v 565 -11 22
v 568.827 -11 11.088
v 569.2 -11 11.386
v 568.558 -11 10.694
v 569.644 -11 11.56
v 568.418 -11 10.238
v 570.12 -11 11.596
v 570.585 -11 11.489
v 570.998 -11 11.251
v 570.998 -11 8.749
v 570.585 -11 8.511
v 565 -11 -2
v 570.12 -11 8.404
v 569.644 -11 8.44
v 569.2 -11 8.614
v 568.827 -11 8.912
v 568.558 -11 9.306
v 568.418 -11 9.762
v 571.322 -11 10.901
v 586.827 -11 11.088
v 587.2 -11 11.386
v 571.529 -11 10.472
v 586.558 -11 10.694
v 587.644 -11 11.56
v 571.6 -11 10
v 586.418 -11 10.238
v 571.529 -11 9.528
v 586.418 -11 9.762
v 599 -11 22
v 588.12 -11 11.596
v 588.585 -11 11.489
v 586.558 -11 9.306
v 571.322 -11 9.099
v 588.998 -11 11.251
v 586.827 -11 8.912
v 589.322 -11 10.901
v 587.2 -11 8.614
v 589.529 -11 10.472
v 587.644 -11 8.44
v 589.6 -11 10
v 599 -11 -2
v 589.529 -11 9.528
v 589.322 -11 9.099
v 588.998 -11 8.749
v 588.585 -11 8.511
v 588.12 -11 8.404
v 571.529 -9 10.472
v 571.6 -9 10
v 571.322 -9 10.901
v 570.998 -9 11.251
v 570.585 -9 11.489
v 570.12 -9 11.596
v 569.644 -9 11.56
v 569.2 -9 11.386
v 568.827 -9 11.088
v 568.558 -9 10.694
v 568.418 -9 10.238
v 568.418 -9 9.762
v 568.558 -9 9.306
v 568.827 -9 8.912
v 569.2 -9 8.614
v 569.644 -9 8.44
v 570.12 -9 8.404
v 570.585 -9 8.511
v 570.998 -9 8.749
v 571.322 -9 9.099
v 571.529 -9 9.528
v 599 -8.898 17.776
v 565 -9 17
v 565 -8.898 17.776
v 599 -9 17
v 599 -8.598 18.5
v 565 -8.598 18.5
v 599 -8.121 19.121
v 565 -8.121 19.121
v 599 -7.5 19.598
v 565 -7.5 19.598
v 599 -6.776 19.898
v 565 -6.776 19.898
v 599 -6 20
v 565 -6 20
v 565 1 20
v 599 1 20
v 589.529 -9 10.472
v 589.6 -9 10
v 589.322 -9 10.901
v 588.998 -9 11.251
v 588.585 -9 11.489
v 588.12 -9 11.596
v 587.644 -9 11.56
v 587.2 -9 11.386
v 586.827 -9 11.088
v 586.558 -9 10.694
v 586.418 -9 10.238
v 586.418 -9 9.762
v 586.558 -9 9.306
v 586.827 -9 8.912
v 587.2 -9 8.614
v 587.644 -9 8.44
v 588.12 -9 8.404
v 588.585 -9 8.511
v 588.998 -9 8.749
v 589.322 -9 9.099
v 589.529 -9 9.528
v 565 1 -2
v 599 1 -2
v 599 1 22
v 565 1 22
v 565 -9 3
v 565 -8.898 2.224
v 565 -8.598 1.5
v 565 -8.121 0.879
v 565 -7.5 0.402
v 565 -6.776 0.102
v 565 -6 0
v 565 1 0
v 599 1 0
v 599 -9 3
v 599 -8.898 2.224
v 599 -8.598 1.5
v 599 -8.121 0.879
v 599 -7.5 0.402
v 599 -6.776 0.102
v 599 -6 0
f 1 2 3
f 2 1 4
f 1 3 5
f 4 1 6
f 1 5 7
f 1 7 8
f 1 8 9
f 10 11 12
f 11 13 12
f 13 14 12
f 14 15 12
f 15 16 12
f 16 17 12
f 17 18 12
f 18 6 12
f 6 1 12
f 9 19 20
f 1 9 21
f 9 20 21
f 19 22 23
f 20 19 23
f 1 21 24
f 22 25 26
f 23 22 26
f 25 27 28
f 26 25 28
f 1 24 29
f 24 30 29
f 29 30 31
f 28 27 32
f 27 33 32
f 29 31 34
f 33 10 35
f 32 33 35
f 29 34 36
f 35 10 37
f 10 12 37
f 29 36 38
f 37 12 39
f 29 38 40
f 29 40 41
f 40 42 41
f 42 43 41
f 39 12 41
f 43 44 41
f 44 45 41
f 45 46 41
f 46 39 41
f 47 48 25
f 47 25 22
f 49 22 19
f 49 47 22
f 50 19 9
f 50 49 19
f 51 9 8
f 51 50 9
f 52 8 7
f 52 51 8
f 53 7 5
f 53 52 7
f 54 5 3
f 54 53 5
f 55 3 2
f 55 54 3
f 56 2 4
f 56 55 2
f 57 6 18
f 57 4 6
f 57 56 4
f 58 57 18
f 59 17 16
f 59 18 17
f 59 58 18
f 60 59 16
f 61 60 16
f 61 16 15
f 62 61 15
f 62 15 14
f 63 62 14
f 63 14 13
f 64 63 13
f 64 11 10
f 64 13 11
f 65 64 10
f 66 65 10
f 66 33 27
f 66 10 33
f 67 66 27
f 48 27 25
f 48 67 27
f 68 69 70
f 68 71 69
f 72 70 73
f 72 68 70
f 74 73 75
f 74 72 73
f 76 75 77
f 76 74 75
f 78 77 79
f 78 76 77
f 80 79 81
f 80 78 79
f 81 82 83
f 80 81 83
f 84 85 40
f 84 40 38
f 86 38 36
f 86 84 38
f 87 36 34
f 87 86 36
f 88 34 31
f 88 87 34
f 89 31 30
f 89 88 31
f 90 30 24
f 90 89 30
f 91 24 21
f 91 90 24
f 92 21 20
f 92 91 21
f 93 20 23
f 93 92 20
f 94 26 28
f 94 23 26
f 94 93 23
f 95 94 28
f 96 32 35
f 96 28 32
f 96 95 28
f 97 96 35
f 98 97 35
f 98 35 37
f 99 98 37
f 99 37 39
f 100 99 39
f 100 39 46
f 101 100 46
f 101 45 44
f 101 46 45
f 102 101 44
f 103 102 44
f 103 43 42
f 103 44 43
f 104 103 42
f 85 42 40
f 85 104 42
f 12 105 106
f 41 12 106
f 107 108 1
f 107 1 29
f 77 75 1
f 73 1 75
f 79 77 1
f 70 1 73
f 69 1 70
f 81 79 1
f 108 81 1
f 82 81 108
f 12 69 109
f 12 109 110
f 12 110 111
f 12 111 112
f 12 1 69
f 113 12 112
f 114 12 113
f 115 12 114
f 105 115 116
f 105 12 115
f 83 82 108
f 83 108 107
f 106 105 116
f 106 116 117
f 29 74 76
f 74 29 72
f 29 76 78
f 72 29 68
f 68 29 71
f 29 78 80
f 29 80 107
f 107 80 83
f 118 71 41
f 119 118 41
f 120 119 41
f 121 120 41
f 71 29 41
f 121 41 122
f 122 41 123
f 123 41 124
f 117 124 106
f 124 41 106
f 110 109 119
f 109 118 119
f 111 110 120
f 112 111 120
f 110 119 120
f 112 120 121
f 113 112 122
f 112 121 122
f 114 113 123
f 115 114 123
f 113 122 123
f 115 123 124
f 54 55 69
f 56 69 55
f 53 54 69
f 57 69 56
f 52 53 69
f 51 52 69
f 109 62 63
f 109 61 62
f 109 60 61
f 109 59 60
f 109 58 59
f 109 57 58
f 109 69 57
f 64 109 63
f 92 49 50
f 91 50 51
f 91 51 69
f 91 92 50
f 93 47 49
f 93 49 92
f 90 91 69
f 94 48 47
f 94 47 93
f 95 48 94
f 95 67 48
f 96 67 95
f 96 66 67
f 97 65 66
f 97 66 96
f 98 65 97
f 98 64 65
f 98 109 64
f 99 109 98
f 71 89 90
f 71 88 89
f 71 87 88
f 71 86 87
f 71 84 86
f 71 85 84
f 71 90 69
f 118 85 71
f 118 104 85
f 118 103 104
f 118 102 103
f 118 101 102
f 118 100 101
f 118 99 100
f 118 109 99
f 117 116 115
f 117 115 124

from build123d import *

# Parameters (mm, degrees)
CYLINDER458_R     = 1.6
CYLINDER458_DEPTH = 15
CYLINDER459_R     = 1.6
CYLINDER459_DEPTH = 15
BOX311_W          = 34
BOX311_H          = 12
BOX311_DEPTH      = 20
FILLET111_R       = 3
BOX310_W          = 34
BOX310_H          = 12
BOX310_DEPTH      = 24


with BuildPart() as cylinder458:
    # Cylinder458 → Cylinder458 (new body)
    with BuildSketch(Plane(origin=(588, 6, 10), x_dir=(1, 0, 0), z_dir=(0, -1, 0))):
        Circle(CYLINDER458_R)
    extrude(amount=CYLINDER458_DEPTH)


with BuildPart() as fusion415:
    # Cylinder459 → Cylinder459 (new body)
    with BuildSketch(Plane(origin=(570, 6, 10), x_dir=(1, 0, 0), z_dir=(0, -1, 0))):
        Circle(CYLINDER459_R)
    extrude(amount=CYLINDER459_DEPTH)

    # Fusion415: union Cylinder458
    add(cylinder458.part)


with BuildPart() as fusion415_1:
    # Fusion415 placement: moved
    add(fusion415.part.moved(Location((0, -4, 0))))


with BuildPart() as fillet111:
    # Box311 → Box311 (new body)
    with BuildSketch(Plane(origin=(565, -9, 0), x_dir=(1, 0, 0), z_dir=(0, 0, 1))):
        with Locations((17, 6)):
            Rectangle(BOX311_W, BOX311_H)
    extrude(amount=BOX311_DEPTH)

    # Fillet111
    fillet111_edges = [fillet111.edges().sort_by_distance(p)[0] for p in [
        (582, -9, 0),
        (582, -9, 20),
    ]]
    fillet(fillet111_edges, radius=FILLET111_R)


with BuildPart() as rear_cross_member_wide_holes:
    # Box310 → Box310 (new body)
    with BuildSketch(Plane(origin=(565, -11, -2), x_dir=(1, 0, 0), z_dir=(0, 0, 1))):
        with Locations((17, 6)):
            Rectangle(BOX310_W, BOX310_H)
    extrude(amount=BOX310_DEPTH)

    # Cut308: cut Fillet111
    add(fillet111.part, mode=Mode.SUBTRACT)

    # Cut309: cut Fusion415
    add(fusion415_1.part, mode=Mode.SUBTRACT)


solid = rear_cross_member_wide_holes.part
